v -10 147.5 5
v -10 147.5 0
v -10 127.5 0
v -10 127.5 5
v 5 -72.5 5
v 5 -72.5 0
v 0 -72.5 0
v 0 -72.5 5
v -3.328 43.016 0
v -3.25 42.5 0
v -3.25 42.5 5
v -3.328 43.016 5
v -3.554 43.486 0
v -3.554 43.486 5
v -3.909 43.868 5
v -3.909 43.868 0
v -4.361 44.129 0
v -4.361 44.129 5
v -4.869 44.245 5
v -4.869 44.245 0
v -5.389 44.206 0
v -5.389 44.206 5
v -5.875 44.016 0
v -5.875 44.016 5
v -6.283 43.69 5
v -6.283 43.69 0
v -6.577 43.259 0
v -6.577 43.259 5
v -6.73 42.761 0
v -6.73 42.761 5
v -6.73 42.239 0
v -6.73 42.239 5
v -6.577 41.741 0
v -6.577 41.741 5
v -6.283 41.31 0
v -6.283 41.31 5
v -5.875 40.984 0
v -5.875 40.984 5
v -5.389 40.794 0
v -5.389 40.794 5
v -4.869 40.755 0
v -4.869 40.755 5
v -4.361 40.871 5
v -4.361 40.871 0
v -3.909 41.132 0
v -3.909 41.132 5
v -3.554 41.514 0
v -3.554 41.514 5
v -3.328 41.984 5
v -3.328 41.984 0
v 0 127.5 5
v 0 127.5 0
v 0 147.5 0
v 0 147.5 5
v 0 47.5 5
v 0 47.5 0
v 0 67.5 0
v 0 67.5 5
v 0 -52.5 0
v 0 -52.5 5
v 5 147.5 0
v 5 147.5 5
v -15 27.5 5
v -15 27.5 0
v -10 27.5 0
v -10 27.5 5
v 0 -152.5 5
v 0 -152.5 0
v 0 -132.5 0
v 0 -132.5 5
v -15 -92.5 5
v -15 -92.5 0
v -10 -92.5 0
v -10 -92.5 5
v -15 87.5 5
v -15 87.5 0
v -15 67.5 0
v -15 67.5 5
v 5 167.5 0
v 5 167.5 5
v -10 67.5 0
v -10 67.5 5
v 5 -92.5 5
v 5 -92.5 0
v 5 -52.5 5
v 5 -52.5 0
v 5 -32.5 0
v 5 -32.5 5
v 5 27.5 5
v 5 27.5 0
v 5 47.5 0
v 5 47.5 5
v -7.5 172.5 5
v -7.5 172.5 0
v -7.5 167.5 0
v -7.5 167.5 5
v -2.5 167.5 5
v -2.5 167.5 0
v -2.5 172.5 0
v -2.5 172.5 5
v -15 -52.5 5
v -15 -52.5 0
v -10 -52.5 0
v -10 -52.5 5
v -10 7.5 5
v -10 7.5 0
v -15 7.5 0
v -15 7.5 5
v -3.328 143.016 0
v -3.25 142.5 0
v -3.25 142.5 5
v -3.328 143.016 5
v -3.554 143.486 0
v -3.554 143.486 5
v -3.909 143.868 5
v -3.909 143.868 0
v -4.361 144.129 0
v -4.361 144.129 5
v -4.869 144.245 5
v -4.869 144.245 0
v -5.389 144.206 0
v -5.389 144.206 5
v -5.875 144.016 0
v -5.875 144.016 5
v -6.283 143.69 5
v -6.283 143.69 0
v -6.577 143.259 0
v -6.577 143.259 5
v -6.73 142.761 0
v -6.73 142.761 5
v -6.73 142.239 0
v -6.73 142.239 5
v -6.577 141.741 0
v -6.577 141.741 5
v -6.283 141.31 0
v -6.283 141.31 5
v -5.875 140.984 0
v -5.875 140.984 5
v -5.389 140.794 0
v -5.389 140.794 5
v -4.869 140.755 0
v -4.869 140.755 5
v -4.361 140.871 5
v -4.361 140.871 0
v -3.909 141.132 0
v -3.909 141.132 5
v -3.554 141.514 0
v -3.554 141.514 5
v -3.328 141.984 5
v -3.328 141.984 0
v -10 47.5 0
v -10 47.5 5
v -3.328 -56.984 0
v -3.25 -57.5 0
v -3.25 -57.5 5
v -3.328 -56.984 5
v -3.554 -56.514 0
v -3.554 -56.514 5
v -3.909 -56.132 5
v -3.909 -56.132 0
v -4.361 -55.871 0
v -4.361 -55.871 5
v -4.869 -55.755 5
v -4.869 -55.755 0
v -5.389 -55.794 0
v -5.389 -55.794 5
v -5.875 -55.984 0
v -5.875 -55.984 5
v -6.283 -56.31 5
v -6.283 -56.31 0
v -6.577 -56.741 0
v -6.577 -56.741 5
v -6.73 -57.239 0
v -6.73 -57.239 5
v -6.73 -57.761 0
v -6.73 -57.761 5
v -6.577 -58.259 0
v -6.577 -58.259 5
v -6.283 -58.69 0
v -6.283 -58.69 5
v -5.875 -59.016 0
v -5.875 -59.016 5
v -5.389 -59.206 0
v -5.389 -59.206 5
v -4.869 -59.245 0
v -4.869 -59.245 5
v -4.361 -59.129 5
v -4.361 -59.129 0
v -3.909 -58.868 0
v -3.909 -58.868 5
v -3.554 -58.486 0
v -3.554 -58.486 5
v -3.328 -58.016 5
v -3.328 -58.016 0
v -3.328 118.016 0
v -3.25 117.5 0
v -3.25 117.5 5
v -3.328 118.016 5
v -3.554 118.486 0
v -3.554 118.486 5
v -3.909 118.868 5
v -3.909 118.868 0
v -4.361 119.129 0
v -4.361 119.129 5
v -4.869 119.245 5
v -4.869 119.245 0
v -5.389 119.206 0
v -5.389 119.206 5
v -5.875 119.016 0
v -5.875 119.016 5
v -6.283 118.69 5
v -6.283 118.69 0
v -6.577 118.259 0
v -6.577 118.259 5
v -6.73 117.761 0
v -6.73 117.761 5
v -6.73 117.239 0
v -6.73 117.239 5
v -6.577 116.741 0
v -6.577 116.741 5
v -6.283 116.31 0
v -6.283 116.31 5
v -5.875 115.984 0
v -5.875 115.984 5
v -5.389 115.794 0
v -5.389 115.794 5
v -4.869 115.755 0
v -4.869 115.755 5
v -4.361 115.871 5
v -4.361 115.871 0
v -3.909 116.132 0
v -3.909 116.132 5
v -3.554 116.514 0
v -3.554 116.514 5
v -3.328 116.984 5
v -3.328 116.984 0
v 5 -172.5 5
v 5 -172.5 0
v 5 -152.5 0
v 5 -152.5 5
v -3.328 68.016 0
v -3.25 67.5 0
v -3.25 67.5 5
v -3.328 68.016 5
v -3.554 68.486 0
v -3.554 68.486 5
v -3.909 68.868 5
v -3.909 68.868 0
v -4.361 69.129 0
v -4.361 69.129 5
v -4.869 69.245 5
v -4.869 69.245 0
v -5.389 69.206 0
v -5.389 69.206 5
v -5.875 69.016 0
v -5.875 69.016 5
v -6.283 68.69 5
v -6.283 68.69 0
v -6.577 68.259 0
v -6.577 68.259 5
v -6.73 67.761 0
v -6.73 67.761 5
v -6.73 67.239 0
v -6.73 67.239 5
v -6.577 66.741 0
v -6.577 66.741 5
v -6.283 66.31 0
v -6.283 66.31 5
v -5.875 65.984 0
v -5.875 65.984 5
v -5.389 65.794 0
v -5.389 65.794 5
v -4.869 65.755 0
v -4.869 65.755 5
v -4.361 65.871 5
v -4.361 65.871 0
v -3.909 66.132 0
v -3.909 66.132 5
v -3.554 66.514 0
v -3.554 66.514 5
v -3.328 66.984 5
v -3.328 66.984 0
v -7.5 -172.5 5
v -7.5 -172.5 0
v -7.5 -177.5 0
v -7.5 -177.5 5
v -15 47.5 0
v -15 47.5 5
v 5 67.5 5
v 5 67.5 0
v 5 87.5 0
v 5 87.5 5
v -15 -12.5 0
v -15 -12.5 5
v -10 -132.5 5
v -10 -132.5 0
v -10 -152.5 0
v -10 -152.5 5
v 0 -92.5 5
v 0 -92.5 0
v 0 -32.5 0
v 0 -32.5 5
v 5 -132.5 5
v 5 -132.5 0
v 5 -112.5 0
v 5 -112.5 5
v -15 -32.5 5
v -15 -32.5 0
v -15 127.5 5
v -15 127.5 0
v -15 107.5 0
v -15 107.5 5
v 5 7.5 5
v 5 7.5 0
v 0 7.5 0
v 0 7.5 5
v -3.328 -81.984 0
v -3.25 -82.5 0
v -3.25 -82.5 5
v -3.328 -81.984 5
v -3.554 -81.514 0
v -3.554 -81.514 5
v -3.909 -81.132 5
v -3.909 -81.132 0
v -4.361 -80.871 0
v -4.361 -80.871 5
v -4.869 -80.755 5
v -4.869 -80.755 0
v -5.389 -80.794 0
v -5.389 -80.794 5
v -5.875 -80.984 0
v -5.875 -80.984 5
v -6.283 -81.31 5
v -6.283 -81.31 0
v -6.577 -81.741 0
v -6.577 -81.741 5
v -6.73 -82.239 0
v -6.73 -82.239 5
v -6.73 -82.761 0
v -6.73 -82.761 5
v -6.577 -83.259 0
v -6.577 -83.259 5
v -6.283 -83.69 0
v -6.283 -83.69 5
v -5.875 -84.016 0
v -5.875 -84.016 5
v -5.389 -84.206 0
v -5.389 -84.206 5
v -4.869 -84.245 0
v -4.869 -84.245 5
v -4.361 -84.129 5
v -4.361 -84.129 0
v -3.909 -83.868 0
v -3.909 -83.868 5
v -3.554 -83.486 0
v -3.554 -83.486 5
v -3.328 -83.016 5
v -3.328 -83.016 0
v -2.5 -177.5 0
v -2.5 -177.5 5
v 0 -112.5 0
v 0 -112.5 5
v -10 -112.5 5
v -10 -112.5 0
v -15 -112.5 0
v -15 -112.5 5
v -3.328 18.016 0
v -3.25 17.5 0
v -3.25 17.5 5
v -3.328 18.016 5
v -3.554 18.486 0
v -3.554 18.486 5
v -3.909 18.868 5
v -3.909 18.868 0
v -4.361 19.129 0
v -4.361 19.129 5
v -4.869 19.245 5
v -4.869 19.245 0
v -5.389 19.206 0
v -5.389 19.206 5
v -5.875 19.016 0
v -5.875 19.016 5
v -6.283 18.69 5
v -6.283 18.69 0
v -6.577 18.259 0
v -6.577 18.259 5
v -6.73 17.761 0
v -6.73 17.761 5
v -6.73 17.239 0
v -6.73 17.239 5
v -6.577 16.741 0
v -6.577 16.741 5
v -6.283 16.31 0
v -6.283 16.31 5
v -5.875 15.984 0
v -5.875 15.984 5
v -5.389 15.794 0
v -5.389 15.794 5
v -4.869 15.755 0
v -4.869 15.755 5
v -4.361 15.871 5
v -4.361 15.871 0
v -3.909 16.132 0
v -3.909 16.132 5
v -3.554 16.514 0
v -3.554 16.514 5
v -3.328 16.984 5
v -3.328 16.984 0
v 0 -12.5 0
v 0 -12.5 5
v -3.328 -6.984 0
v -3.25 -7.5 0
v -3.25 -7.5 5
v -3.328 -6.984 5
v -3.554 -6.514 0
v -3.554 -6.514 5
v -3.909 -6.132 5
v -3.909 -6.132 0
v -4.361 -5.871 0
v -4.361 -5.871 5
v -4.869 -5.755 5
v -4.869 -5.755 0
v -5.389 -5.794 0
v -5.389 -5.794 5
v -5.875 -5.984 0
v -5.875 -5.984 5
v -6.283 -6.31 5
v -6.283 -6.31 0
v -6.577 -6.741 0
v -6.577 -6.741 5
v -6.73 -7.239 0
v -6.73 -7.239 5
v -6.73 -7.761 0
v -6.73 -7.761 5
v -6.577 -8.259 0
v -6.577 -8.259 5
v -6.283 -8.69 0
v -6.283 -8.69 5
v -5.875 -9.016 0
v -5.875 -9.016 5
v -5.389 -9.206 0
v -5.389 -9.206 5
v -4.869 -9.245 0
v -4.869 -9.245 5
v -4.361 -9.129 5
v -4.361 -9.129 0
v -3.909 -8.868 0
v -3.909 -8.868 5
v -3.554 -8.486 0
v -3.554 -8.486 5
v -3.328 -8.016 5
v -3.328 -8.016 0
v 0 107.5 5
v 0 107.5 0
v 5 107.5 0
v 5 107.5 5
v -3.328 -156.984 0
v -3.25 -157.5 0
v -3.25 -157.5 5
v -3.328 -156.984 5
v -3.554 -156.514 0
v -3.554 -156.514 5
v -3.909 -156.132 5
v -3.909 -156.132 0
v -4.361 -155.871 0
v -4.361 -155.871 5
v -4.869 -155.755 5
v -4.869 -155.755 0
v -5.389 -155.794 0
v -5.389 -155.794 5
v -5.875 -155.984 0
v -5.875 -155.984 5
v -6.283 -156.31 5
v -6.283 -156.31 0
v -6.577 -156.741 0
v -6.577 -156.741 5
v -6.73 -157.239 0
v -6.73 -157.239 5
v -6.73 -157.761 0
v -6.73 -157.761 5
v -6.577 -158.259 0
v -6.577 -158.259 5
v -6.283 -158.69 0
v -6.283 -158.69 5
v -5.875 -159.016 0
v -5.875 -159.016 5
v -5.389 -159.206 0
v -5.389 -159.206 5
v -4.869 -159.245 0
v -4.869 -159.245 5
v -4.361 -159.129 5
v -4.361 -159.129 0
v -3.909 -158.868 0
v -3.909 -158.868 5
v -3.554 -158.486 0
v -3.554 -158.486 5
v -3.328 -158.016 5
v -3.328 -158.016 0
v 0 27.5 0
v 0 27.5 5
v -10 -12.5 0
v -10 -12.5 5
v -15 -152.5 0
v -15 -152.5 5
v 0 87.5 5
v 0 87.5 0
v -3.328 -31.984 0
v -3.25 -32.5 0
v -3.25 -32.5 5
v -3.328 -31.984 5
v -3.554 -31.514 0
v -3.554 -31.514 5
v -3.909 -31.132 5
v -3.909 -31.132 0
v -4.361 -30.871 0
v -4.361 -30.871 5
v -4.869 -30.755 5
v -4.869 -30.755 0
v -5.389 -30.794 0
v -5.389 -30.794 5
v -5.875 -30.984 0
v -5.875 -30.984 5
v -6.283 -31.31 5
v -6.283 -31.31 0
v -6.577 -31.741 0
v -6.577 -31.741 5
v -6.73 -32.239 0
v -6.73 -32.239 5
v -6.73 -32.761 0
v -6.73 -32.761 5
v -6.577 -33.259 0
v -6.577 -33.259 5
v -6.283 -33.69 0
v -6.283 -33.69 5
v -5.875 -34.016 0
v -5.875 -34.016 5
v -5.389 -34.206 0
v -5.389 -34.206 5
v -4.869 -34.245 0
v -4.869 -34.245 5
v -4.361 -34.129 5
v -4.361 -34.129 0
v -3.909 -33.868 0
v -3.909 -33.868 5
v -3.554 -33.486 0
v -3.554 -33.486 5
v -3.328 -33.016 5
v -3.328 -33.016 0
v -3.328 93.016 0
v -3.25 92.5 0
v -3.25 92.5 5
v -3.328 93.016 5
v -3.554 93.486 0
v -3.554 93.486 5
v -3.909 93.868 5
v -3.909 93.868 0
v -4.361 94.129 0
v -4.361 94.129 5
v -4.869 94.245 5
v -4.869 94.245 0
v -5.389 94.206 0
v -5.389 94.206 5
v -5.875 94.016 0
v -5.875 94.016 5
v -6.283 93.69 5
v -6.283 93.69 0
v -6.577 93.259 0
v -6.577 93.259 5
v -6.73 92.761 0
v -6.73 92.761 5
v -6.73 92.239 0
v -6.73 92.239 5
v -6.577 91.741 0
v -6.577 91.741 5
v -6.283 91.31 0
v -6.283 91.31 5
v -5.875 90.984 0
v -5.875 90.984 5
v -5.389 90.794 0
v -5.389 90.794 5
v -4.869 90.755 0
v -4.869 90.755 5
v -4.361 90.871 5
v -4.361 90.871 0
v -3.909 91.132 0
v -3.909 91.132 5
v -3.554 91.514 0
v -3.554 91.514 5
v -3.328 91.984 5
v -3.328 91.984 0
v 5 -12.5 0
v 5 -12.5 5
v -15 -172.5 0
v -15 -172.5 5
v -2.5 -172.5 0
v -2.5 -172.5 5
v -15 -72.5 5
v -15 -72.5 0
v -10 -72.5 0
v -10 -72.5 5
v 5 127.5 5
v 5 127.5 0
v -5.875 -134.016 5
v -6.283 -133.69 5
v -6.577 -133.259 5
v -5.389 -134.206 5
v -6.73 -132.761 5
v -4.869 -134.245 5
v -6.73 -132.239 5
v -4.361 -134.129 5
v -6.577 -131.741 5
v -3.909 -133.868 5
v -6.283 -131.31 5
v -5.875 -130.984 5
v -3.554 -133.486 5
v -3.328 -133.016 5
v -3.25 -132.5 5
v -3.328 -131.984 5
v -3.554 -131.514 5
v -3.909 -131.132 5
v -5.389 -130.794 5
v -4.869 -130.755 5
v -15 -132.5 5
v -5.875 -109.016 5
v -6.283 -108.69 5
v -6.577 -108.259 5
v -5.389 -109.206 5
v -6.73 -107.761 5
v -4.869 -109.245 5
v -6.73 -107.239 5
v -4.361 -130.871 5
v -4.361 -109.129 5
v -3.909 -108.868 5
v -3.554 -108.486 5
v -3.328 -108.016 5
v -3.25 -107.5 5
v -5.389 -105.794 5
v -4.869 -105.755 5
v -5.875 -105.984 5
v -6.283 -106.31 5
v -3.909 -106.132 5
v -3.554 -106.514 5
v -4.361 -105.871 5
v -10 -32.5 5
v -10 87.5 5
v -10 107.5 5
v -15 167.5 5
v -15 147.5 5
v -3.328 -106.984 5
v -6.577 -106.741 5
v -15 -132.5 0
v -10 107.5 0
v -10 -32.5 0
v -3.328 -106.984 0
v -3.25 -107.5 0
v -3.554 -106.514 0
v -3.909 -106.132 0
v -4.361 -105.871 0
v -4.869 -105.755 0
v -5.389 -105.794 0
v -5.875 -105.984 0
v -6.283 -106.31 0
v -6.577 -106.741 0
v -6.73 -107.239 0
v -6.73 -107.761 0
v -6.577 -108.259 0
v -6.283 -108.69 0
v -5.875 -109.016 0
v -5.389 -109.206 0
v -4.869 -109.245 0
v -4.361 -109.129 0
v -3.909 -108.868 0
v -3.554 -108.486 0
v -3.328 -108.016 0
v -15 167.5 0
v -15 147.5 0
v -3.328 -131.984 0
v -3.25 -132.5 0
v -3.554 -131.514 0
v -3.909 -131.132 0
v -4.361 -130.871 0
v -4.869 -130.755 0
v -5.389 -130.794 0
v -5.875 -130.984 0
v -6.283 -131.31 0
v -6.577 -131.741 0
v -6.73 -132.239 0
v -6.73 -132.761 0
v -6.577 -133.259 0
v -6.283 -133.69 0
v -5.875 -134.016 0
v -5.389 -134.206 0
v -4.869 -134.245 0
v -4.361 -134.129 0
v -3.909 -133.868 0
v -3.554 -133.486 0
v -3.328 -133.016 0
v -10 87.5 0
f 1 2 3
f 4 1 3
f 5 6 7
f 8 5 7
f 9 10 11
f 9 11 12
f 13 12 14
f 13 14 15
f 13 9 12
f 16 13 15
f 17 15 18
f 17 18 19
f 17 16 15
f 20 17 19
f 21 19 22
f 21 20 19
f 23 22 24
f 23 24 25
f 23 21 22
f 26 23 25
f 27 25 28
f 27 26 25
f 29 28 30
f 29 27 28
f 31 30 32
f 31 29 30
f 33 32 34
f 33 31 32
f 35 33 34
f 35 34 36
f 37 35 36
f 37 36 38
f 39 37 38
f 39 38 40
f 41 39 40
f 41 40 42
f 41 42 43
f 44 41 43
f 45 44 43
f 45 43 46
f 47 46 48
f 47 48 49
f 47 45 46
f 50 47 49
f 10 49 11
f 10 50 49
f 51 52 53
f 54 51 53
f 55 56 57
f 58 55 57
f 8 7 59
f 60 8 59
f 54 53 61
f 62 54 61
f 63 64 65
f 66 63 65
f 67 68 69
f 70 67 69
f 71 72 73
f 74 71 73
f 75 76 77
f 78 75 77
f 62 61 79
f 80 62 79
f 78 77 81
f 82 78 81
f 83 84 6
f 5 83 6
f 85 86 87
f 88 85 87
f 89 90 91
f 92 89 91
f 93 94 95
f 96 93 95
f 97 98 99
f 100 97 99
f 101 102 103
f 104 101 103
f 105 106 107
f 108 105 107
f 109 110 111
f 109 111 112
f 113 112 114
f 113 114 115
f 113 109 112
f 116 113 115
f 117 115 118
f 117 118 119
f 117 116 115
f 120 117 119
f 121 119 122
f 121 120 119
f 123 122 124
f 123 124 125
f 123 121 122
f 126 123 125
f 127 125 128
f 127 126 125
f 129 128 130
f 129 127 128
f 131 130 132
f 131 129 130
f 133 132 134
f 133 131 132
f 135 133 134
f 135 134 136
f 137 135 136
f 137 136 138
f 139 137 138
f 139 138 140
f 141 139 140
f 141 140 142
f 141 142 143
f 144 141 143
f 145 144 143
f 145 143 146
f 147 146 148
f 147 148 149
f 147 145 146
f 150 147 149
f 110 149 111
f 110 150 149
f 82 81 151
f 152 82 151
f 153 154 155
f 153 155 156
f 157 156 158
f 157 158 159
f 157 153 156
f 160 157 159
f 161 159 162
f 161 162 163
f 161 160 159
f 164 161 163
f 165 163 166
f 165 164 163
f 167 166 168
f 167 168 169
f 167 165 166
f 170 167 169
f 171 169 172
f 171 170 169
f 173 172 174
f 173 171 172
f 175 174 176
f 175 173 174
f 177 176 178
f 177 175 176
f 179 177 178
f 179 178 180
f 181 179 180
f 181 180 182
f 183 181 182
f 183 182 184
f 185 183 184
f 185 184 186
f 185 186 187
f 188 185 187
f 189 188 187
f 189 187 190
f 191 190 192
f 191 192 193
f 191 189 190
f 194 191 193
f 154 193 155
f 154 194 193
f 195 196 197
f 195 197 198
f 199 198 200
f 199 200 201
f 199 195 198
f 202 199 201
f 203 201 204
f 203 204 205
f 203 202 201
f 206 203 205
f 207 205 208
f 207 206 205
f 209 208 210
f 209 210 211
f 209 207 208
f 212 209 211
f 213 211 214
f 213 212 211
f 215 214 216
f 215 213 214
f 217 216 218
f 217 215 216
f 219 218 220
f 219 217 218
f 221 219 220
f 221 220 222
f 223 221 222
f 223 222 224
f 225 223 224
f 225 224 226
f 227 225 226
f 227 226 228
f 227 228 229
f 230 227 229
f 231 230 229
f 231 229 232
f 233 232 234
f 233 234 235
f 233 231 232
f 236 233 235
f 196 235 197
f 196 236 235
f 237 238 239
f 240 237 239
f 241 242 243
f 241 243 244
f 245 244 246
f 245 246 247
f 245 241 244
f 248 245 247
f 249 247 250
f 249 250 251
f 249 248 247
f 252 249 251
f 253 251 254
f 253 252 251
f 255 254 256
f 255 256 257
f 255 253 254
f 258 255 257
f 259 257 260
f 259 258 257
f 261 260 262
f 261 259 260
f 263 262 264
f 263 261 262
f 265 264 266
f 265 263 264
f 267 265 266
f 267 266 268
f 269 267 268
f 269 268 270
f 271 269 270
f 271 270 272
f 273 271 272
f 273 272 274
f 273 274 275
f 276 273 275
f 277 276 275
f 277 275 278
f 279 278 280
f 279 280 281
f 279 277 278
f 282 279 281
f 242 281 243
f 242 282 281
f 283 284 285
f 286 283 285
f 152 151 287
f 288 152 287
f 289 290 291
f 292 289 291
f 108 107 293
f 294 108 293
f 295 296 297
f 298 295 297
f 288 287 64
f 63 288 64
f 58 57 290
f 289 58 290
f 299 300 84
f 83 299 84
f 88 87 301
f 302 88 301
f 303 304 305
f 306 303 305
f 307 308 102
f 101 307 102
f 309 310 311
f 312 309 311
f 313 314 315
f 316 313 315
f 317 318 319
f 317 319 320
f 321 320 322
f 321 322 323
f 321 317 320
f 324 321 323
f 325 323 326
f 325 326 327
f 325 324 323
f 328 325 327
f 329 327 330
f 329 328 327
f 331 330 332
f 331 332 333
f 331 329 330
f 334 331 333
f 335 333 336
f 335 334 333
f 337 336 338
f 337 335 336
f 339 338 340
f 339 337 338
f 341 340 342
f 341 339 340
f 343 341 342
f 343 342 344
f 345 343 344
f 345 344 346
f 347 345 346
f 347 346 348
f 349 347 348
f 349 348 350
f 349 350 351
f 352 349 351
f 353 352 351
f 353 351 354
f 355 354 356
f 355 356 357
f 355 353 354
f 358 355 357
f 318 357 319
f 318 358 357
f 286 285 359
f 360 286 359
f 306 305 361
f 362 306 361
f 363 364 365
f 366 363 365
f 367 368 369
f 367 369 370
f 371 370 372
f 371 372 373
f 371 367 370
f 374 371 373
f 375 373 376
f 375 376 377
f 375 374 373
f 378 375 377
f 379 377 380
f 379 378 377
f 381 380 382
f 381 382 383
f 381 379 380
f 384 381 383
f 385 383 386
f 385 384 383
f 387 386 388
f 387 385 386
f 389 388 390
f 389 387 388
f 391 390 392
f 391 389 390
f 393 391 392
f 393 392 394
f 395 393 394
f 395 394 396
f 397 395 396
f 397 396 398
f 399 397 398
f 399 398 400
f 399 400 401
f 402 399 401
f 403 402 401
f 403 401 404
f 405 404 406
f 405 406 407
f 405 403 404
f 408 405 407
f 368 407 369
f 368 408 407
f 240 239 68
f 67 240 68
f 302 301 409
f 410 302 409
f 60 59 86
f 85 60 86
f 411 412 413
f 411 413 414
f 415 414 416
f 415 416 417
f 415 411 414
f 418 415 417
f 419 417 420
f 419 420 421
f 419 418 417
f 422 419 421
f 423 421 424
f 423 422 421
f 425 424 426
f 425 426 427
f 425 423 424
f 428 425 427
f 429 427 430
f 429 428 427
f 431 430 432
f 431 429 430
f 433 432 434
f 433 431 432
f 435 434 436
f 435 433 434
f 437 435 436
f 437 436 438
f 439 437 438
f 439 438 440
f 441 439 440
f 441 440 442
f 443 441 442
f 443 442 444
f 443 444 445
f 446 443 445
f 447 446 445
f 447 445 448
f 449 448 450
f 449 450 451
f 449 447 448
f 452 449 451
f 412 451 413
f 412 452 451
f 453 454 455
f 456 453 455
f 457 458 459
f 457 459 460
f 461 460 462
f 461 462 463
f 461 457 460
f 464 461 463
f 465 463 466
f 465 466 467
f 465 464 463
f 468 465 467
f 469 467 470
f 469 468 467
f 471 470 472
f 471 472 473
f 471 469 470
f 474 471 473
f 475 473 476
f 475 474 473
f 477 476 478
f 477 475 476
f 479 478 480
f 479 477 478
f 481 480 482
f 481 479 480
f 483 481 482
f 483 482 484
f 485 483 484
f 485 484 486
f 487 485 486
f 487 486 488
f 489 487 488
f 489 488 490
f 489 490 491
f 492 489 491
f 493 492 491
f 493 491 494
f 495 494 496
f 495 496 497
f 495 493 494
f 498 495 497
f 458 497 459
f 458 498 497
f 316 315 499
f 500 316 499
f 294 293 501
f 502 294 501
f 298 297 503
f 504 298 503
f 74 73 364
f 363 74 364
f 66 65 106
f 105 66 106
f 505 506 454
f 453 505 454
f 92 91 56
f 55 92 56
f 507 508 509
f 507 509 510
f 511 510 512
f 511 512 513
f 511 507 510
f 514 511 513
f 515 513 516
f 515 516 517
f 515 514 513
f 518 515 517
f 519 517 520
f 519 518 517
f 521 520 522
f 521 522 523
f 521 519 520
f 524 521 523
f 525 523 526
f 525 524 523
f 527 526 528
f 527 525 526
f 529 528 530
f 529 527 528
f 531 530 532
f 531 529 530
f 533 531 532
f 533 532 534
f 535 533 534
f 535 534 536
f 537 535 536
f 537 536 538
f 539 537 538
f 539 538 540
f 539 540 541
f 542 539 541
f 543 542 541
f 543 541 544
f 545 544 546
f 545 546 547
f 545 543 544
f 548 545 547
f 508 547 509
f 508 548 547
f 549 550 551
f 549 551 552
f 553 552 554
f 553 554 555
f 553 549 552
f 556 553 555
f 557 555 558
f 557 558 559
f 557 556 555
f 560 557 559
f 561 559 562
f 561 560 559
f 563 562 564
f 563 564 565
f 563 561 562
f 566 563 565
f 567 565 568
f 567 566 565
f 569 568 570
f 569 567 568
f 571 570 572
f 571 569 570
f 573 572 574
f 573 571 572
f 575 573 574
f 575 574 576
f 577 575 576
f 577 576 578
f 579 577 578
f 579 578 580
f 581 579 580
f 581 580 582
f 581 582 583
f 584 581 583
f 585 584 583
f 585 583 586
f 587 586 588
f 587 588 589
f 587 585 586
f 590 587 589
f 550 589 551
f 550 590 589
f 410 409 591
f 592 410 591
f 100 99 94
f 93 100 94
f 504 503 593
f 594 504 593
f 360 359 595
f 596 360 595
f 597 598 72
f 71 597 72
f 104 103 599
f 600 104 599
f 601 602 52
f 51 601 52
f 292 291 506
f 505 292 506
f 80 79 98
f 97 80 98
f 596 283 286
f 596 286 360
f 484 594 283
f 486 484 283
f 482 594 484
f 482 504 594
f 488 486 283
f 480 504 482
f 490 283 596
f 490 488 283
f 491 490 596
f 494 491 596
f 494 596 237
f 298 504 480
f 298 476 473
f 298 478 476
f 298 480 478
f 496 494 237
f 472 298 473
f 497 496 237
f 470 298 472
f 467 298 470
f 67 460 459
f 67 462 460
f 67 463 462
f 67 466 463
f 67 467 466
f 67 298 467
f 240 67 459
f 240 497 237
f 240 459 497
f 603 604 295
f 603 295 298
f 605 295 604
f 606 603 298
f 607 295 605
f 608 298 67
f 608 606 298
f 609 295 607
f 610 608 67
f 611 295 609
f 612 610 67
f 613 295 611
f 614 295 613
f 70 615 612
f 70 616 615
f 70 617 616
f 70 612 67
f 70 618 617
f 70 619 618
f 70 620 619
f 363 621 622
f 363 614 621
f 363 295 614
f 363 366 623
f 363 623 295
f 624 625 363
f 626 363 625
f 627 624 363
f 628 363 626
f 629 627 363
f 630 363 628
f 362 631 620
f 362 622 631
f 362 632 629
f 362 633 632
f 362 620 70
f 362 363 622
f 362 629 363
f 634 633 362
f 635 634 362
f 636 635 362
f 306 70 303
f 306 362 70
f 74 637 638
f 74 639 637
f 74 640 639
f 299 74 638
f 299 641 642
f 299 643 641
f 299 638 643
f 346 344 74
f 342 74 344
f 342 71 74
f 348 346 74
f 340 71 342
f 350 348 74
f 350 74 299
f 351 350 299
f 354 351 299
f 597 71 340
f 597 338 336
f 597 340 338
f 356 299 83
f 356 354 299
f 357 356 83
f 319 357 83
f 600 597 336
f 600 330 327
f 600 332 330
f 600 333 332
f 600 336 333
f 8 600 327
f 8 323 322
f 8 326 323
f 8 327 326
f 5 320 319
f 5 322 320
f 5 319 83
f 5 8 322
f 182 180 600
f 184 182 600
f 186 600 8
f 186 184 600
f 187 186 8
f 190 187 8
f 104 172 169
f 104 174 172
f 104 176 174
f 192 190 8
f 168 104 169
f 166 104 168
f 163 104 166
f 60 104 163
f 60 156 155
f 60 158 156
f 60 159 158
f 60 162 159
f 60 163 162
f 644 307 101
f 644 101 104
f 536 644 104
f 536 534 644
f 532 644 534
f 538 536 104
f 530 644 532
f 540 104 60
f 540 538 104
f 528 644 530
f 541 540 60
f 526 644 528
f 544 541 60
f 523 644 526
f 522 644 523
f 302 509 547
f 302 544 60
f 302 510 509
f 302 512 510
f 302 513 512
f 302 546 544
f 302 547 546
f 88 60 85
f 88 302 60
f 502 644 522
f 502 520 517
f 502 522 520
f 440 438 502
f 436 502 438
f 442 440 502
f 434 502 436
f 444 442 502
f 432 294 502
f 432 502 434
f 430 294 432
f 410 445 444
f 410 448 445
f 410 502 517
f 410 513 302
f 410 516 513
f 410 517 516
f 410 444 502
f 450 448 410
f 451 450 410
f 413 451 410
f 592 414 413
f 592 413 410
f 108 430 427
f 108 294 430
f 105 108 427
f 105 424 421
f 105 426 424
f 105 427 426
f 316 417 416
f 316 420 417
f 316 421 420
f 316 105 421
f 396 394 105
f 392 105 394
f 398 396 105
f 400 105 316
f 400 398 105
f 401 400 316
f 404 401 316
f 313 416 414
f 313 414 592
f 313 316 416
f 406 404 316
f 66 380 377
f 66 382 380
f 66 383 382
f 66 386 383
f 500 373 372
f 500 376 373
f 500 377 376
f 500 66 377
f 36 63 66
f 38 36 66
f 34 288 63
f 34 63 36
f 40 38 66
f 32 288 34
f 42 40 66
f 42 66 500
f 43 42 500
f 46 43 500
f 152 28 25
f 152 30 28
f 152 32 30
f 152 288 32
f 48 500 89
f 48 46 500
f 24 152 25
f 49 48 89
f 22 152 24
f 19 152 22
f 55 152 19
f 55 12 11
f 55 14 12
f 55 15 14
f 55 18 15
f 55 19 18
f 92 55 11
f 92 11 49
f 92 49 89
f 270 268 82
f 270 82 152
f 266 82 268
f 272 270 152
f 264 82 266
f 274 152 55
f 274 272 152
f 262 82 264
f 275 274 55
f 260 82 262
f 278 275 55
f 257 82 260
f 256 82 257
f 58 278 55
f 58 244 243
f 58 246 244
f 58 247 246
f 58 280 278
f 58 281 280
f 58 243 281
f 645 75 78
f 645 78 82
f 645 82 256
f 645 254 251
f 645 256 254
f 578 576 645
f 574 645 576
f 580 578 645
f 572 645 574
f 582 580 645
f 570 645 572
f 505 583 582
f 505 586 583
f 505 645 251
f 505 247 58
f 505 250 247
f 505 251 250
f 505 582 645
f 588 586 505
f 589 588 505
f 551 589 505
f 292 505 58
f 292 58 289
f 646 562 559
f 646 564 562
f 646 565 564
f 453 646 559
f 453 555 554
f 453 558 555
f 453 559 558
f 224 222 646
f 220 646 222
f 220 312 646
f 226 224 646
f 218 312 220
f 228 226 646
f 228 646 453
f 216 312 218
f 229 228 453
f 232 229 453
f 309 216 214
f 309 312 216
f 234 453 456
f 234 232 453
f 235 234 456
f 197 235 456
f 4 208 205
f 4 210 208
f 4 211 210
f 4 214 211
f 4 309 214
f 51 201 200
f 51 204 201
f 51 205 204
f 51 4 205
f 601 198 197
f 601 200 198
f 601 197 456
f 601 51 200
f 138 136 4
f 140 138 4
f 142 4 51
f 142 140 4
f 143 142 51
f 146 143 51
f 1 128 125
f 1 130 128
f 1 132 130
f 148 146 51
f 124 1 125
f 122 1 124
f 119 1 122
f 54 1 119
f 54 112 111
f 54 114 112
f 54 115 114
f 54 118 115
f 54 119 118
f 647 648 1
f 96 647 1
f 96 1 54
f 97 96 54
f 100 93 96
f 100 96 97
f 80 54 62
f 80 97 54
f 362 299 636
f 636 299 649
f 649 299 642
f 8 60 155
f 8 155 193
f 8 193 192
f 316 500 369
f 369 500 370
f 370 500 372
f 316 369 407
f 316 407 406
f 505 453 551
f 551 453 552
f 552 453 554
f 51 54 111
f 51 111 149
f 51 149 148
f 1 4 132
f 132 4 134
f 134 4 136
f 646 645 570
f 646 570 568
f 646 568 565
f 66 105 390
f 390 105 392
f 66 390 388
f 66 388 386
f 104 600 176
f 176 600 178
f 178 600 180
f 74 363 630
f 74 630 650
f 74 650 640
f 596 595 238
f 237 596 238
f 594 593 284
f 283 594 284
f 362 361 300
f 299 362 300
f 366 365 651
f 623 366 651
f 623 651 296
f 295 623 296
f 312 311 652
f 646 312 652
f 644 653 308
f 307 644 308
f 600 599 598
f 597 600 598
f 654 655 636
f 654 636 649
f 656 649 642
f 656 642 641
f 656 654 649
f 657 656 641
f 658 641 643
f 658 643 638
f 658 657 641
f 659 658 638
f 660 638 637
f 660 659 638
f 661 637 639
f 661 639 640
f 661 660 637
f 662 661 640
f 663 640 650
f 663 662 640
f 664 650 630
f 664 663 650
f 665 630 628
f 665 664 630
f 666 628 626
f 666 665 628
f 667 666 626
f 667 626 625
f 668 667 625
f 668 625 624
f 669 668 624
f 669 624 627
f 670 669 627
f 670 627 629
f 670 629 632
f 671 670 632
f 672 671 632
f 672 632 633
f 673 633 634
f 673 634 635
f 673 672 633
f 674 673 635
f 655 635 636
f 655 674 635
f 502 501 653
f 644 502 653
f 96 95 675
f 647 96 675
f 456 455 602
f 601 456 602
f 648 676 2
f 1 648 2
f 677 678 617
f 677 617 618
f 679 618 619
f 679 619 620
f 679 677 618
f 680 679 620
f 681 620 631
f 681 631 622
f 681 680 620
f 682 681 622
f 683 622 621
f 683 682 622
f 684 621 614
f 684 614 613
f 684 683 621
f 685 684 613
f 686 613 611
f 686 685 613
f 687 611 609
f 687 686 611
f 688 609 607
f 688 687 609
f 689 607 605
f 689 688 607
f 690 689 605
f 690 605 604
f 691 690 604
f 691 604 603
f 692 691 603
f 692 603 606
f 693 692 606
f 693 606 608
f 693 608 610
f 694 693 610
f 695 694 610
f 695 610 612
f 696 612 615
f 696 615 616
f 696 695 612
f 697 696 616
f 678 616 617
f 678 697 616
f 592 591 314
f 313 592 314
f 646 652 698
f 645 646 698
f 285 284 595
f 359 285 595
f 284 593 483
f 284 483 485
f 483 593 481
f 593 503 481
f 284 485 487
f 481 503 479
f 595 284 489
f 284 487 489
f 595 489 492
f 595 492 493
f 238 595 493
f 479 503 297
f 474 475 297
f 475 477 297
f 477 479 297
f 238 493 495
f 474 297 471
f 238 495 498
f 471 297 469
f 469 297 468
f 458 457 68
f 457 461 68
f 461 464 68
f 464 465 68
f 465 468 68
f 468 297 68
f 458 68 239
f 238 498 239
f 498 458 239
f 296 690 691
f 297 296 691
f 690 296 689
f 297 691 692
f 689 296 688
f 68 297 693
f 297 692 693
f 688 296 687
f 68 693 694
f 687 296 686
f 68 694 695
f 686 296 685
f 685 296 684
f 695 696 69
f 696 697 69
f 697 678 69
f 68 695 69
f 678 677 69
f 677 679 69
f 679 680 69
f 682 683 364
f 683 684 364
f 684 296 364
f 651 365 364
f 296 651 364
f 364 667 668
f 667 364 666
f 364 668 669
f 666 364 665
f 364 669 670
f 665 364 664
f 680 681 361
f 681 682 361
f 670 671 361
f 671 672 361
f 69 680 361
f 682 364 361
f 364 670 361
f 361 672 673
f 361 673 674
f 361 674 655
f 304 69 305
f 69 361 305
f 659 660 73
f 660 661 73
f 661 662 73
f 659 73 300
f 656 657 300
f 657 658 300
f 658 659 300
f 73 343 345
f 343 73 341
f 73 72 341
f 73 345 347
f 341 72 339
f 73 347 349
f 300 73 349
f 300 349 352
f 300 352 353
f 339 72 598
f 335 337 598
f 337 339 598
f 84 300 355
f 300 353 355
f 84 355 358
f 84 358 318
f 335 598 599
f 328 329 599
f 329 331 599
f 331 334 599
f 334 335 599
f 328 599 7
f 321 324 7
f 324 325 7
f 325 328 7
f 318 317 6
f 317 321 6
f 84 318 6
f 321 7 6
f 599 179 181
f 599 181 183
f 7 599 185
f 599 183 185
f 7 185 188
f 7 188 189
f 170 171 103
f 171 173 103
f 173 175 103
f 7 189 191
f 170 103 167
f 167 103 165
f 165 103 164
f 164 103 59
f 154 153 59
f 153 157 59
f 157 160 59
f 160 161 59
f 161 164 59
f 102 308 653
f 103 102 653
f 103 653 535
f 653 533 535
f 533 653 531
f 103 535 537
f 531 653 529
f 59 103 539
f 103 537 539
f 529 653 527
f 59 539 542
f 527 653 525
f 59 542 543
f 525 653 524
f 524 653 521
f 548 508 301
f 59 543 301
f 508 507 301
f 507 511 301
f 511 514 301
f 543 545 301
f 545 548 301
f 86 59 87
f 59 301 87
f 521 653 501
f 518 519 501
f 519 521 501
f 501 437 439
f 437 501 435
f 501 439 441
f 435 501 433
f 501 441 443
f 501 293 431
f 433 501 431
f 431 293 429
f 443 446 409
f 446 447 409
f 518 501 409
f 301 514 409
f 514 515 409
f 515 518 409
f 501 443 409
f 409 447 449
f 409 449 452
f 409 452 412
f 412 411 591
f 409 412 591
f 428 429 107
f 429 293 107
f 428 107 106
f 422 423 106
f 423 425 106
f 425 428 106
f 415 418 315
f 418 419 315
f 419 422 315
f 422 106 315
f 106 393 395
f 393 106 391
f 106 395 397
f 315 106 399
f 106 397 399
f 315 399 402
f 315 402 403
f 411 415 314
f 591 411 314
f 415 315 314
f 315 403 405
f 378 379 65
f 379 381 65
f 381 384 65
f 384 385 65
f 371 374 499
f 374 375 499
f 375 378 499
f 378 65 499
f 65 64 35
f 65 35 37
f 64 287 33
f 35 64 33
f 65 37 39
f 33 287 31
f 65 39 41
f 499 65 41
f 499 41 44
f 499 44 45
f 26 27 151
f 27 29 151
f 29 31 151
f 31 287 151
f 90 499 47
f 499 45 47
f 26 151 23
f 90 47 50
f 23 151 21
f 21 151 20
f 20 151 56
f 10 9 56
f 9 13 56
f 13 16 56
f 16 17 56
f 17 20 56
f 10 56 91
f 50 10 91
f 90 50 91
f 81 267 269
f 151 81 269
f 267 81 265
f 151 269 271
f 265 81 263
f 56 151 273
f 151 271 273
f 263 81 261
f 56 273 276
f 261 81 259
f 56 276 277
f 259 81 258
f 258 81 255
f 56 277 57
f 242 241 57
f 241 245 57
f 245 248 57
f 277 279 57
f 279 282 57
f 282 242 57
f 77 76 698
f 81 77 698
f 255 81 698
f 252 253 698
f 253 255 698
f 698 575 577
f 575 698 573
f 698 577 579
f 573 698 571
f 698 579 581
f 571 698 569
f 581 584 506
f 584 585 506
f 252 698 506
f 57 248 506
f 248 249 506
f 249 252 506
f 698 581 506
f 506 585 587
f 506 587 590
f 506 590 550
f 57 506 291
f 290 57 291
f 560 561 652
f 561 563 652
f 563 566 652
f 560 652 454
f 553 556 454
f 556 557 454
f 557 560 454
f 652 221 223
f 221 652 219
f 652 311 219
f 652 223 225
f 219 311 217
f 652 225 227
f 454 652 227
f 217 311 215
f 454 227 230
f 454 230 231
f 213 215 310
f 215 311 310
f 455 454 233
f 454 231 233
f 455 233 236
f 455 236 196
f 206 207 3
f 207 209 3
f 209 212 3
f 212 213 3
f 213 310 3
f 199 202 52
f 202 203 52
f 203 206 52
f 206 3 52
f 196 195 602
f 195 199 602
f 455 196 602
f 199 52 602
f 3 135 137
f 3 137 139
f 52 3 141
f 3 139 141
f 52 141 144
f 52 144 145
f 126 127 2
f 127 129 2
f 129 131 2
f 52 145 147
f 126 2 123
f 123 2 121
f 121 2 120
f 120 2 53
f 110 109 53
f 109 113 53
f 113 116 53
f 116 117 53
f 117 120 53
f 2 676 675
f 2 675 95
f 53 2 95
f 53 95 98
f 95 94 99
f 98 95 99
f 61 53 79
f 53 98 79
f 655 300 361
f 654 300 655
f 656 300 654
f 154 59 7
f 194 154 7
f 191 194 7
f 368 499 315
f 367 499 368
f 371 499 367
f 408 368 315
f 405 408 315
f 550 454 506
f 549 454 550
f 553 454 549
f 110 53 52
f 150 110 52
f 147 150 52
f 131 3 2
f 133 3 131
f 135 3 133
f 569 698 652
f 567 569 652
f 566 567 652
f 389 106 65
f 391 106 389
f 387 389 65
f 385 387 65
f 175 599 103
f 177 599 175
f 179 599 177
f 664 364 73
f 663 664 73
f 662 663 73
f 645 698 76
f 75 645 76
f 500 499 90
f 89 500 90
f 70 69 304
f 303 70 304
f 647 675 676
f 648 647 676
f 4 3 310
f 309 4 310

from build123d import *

# Parameters (mm, degrees)
MODEL_R             = 1.75
BOSS_EXTRUDE1_DEPTH = 5


with BuildPart() as part:
    # Model → Boss-Extrude1 (new body)
    with BuildSketch(Plane.XY):
        Polygon((5, -152.5), (0, -152.5), (0, -132.5), (5, -132.5), (5, -112.5), (0, -112.5), (0, -92.5), (5, -92.5), (5, -72.5), (0, -72.5), (0, -52.5), (5, -52.5), (5, -32.5), (0, -32.5), (0, -12.5), (5, -12.5), (5, 7.5), (0, 7.5), (0, 27.5), (5, 27.5), (5, 47.5), (0, 47.5), (0, 67.5), (5, 67.5), (5, 87.5), (0, 87.5), (0, 107.5), (5, 107.5), (5, 127.5), (0, 127.5), (0, 147.5), (5, 147.5), (5, 167.5), (-2.5, 167.5), (-2.5, 172.5), (-7.5, 172.5), (-7.5, 167.5), (-15, 167.5), (-15, 147.5), (-10, 147.5), (-10, 127.5), (-15, 127.5), (-15, 107.5), (-10, 107.5), (-10, 87.5), (-15, 87.5), (-15, 67.5), (-10, 67.5), (-10, 47.5), (-15, 47.5), (-15, 27.5), (-10, 27.5), (-10, 7.5), (-15, 7.5), (-15, -12.5), (-10, -12.5), (-10, -32.5), (-15, -32.5), (-15, -52.5), (-10, -52.5), (-10, -72.5), (-15, -72.5), (-15, -92.5), (-10, -92.5), (-10, -112.5), (-15, -112.5), (-15, -132.5), (-10, -132.5), (-10, -152.5), (-15, -152.5), (-15, -172.5), (-7.5, -172.5), (-7.5, -177.5), (-2.5, -177.5), (-2.5, -172.5), (5, -172.5), align=None)
        with Locations((-5, 142.5)):
            Circle(MODEL_R, mode=Mode.SUBTRACT)
        with Locations((-5, 117.5)):
            Circle(MODEL_R, mode=Mode.SUBTRACT)
        with Locations((-5, 92.5)):
            Circle(MODEL_R, mode=Mode.SUBTRACT)
        with Locations((-5, 67.5)):
            Circle(MODEL_R, mode=Mode.SUBTRACT)
        with Locations((-5, 42.5)):
            Circle(MODEL_R, mode=Mode.SUBTRACT)
        with Locations((-5, 17.5)):
            Circle(MODEL_R, mode=Mode.SUBTRACT)
        with Locations((-5, -7.5)):
            Circle(MODEL_R, mode=Mode.SUBTRACT)
        with Locations((-5, -32.5)):
            Circle(MODEL_R, mode=Mode.SUBTRACT)
        with Locations((-5, -57.5)):
            Circle(MODEL_R, mode=Mode.SUBTRACT)
        with Locations((-5, -82.5)):
            Circle(MODEL_R, mode=Mode.SUBTRACT)
        with Locations((-5, -107.5)):
            Circle(MODEL_R, mode=Mode.SUBTRACT)
        with Locations((-5, -132.5)):
            Circle(MODEL_R, mode=Mode.SUBTRACT)
        with Locations((-5, -157.5)):
            Circle(MODEL_R, mode=Mode.SUBTRACT)
    extrude(amount=BOSS_EXTRUDE1_DEPTH)


solid = part.part
